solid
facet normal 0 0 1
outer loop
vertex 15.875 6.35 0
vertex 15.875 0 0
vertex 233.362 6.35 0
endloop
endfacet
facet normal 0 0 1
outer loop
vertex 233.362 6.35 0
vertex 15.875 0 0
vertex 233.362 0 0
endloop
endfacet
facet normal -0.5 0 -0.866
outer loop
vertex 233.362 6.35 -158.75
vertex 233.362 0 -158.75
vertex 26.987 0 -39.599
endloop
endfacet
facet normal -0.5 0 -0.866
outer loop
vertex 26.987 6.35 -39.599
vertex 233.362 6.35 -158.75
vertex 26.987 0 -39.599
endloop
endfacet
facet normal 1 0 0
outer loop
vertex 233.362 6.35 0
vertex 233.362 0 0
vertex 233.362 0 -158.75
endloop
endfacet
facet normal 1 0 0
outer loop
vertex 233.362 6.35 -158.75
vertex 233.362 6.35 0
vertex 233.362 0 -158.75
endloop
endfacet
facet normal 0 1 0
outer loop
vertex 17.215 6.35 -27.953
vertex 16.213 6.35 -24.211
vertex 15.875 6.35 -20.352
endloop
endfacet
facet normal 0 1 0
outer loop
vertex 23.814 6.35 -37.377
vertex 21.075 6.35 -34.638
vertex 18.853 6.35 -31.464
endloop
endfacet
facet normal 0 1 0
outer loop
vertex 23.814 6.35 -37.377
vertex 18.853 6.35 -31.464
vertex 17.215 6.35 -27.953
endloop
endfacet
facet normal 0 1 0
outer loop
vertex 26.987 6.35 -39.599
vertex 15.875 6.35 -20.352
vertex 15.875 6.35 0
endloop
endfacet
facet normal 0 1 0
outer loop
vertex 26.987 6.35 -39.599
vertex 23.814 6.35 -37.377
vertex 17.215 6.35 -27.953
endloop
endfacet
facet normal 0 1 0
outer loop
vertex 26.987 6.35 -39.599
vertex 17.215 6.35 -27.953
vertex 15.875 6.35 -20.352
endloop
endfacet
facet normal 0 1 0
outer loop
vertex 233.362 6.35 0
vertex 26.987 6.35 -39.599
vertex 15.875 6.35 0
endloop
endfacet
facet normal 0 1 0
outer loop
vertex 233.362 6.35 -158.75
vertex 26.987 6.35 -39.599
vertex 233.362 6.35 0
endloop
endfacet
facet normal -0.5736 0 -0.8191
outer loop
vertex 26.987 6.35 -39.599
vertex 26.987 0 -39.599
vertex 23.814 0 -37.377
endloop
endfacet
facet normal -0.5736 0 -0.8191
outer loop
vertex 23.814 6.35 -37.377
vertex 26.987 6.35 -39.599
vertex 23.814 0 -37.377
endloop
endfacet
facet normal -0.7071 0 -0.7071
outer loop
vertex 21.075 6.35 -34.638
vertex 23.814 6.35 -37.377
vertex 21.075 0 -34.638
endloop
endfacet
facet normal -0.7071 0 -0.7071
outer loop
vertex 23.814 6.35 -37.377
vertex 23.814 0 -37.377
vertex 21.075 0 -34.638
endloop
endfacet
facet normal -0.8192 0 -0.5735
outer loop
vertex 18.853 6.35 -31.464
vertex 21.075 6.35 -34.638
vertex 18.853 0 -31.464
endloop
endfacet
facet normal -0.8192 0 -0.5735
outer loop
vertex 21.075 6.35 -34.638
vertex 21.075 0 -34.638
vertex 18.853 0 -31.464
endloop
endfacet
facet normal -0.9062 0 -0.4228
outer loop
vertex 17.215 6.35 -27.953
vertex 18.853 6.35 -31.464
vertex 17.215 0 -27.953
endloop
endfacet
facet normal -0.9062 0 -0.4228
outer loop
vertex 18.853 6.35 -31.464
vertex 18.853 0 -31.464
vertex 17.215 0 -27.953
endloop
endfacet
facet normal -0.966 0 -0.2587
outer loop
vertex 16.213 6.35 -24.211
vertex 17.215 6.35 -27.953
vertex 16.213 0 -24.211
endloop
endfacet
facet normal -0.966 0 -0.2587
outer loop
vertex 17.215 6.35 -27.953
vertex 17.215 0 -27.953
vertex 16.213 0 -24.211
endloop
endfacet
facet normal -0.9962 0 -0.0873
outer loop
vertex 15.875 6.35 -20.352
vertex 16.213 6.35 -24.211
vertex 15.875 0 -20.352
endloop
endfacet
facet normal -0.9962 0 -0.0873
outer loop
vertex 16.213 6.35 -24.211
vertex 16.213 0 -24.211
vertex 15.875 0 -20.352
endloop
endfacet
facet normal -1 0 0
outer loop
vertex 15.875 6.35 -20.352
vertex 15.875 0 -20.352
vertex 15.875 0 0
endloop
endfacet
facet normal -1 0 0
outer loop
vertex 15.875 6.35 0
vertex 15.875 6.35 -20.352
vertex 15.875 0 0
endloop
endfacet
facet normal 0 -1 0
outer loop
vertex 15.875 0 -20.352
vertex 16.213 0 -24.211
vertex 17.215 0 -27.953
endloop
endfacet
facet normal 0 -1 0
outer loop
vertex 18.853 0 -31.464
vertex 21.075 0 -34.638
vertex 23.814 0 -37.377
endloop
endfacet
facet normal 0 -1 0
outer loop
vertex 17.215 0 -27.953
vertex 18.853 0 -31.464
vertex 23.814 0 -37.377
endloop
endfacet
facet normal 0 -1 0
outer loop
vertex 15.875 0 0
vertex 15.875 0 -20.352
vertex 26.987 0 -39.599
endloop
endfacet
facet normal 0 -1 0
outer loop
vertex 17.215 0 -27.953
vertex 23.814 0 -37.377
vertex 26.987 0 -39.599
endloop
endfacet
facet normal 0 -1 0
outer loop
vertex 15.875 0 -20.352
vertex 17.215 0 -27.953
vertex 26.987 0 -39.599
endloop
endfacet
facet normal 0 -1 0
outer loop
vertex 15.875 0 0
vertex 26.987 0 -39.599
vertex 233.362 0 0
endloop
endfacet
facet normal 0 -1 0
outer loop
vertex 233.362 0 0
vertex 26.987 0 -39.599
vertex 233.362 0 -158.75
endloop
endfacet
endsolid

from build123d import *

# Parameters (mm, degrees)
BOSS_EXTRUDE1_DEPTH   = 6.35
BOSS_EXTRUDE1_2_DEPTH = 6.35


with BuildPart() as part:
    # Sketch1 → Boss-Extrude1 (new body)
    with BuildSketch(Plane(origin=(0, 0, 0), x_dir=(1, 0, 0), z_dir=(0, 1, 0))):
        with BuildLine():
            ThreePointArc((-26.9875, 39.599338196), (-18.852585401, 31.464423597), (-15.875, 20.351923597))
            Line((-15.875, 20.351923597), (-15.875, 0))
            Line((-15.875, 0), (-233.3625, 0))
            Line((-233.3625, 0), (-233.3625, 158.75))
            Line((-233.3625, 158.75), (-26.9875, 39.599338196))
        make_face()
    extrude(amount=BOSS_EXTRUDE1_DEPTH)


with BuildPart() as body_2:
    # Sketch1 → Boss-Extrude1 2 (new body)
    with BuildSketch(Plane(origin=(0, 0, 0), x_dir=(1, 0, 0), z_dir=(0, 1, 0))):
        with BuildLine():
            Line((233.3625, 158.75), (26.9875, 39.599338196))
            ThreePointArc((26.9875, 39.599338196), (18.852585401, 31.464423597), (15.875, 20.351923597))
            Line((15.875, 20.351923597), (15.875, 0))
            Line((15.875, 0), (233.3625, 0))
            Line((233.3625, 0), (233.3625, 158.75))
        make_face()
    extrude(amount=BOSS_EXTRUDE1_2_DEPTH)


solid = body_2.part
